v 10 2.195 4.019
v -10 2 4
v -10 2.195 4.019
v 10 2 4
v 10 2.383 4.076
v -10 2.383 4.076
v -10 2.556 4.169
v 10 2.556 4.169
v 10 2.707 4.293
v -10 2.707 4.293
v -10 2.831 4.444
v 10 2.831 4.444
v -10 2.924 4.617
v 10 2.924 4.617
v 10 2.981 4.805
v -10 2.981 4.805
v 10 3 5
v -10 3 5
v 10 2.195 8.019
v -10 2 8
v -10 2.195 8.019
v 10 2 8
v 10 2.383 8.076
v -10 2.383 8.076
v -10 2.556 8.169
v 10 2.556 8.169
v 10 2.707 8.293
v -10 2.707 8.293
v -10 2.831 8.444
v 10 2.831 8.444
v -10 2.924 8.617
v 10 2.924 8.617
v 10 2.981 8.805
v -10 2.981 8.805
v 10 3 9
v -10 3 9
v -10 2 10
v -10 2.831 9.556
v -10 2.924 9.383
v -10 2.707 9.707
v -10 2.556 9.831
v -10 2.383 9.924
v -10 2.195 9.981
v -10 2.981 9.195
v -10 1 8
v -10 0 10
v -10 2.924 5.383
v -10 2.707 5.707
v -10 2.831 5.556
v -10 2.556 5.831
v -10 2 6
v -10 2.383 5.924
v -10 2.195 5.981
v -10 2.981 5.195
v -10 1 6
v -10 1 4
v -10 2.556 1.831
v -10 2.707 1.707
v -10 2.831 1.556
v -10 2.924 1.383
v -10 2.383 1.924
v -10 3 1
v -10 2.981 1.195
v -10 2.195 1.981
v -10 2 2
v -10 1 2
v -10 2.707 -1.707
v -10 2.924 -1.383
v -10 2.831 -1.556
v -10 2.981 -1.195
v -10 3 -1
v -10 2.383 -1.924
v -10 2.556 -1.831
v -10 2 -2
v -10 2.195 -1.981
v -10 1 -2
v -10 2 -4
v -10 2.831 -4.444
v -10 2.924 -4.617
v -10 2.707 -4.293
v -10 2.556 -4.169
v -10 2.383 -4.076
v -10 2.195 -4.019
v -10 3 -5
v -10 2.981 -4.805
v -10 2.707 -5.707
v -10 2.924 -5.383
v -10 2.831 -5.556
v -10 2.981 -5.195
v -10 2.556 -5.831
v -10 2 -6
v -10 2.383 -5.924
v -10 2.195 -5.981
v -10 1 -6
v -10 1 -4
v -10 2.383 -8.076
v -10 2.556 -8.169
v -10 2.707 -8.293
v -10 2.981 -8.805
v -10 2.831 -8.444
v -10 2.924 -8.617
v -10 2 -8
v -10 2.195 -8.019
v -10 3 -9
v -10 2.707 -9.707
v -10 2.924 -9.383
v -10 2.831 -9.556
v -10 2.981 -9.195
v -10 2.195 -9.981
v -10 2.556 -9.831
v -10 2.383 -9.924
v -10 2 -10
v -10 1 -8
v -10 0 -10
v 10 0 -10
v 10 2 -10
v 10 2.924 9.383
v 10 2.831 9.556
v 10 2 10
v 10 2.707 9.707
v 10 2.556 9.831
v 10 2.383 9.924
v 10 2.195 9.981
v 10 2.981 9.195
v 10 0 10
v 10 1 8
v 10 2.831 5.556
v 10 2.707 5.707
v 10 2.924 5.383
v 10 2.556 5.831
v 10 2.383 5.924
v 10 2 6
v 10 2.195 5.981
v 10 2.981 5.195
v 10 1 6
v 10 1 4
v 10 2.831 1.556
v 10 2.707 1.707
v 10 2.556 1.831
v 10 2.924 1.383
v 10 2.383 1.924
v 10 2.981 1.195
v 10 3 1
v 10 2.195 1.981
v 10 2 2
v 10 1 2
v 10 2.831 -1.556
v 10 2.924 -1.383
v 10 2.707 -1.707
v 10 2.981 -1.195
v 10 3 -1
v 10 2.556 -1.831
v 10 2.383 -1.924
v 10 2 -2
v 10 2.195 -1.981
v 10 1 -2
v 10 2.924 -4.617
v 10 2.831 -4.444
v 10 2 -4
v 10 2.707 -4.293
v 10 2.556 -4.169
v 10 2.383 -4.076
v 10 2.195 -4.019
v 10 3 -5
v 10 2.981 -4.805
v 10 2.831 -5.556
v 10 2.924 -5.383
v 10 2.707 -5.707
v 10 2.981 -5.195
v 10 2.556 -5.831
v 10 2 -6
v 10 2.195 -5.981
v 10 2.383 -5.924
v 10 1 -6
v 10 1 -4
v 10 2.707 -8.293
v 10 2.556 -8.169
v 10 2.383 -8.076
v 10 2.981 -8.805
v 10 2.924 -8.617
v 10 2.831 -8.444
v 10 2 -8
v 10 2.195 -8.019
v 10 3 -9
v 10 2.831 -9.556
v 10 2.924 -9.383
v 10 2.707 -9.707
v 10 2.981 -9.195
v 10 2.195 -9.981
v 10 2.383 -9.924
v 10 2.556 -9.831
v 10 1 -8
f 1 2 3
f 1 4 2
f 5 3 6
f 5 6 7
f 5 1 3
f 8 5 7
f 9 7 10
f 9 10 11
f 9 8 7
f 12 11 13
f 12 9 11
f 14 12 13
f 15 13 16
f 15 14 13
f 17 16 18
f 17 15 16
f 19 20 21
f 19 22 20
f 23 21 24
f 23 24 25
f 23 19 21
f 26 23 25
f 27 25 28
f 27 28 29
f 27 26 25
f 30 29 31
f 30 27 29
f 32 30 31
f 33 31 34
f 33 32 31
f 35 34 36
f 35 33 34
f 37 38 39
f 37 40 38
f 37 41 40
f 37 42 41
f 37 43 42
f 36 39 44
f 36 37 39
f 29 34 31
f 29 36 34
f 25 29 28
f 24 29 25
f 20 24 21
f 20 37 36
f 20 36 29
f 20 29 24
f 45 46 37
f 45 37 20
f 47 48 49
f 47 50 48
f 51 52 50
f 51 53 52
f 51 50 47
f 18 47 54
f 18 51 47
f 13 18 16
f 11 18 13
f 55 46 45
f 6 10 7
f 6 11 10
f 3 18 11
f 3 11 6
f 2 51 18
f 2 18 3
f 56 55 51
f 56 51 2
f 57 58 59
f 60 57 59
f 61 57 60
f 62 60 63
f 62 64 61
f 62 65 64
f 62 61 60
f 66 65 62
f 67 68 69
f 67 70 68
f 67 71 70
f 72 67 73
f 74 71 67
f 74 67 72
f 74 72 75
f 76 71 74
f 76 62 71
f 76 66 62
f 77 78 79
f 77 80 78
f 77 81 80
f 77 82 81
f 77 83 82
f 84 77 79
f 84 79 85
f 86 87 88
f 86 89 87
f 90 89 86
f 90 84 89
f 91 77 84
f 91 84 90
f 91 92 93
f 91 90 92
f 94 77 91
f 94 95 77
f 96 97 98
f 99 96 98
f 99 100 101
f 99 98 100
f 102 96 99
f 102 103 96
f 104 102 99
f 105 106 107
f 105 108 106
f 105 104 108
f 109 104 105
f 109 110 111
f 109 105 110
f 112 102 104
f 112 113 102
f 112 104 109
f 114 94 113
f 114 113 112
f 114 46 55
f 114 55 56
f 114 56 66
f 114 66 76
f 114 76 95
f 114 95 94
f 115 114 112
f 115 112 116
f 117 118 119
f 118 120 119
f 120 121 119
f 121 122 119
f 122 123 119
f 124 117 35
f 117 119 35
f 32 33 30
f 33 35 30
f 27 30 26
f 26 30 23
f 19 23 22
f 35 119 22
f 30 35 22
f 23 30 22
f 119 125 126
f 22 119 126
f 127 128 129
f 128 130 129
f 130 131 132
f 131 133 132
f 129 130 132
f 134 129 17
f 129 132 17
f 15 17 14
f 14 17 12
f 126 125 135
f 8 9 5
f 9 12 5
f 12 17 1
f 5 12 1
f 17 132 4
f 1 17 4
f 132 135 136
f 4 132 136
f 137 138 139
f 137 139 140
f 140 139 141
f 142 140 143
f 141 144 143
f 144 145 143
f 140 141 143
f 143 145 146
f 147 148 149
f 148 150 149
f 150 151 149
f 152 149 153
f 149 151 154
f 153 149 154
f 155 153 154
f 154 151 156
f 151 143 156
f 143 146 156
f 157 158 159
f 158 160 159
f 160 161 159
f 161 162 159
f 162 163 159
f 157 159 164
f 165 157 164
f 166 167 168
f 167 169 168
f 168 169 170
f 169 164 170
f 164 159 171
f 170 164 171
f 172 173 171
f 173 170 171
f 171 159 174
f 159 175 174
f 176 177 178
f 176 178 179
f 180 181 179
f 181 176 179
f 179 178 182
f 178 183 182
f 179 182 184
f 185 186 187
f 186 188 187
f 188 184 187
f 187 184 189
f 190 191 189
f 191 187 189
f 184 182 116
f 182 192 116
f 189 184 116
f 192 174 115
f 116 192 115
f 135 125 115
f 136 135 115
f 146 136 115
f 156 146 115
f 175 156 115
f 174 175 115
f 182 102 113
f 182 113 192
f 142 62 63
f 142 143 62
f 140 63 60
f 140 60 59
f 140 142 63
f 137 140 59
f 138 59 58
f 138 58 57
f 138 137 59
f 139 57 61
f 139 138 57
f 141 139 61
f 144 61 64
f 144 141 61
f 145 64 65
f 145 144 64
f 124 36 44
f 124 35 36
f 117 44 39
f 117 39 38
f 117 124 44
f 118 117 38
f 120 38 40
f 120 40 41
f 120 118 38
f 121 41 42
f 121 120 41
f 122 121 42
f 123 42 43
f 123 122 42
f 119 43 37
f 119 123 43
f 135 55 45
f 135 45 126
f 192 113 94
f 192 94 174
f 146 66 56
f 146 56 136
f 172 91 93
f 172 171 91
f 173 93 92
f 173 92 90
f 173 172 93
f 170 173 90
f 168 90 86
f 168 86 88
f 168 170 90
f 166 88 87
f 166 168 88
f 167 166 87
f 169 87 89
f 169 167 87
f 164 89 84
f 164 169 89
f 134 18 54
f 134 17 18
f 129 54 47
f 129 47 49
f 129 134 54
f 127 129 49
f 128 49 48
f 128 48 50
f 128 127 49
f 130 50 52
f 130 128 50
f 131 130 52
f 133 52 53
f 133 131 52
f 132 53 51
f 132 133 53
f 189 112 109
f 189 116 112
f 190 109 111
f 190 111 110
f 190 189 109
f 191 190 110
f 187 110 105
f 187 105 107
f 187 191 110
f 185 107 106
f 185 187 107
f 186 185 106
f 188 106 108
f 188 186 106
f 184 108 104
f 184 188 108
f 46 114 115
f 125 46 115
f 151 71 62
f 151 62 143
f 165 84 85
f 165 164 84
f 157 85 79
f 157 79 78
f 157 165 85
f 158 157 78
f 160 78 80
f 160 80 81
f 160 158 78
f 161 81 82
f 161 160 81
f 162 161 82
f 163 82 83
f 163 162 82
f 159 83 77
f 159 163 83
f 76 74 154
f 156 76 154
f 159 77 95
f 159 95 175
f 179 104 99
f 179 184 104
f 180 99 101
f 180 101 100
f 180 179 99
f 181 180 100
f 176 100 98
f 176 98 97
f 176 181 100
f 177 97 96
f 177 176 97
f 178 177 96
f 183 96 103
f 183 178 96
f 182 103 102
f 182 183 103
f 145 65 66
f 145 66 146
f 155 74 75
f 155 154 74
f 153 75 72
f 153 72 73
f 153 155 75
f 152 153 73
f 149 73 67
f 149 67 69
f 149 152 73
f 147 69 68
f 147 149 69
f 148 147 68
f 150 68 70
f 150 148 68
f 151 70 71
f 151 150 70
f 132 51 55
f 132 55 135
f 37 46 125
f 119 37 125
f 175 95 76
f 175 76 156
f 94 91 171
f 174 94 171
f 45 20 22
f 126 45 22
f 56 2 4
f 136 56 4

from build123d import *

# Parameters (mm, degrees)
SKETCH_1_W          = 20
SKETCH_1_H          = 20
EXTRUDE_1_DEPTH     = 3
SKETCH_2_W          = 20
SKETCH_2_H          = 2
CUT_EXTRUDE_1_DEPTH = 2
FILLET_1_R          = 1


with BuildPart() as part:
    # 草图1 → 凸台-拉伸1 (new body)
    with BuildSketch(Plane(origin=(0, 0, 0), x_dir=(1, 0, 0), z_dir=(0, 1, 0))):
        Rectangle(SKETCH_1_W, SKETCH_1_H)
    extrude(amount=EXTRUDE_1_DEPTH)

    # 草图2 → 切除-拉伸1 (cut)
    with BuildSketch(Plane(origin=(0, 3, 0), x_dir=(1, 0, 0), z_dir=(0, 1, 0))):
        with Locations((0, -7)):
            Rectangle(SKETCH_2_W, SKETCH_2_H)
        with Locations((0, -3)):
            Rectangle(SKETCH_2_W, SKETCH_2_H)
        with Locations((0, 7)):
            Rectangle(SKETCH_2_W, SKETCH_2_H)
        with Locations((0, 3)):
            Rectangle(SKETCH_2_W, SKETCH_2_H)
    extrude(amount=-CUT_EXTRUDE_1_DEPTH, mode=Mode.SUBTRACT)

    # 圆角1
    fillet_1_edges = [part.edges().sort_by_distance(p)[0] for p in [
        (0, 3, 10),
        (0, 3, 6),
        (0, 3, 8),
        (0, 3, -4),
        (0, 3, -2),
        (0, 3, -8),
        (0, 3, -6),
        (0, 3, 2),
        (0, 3, 4),
        (0, 3, -10),
    ]]
    fillet(fillet_1_edges, radius=FILLET_1_R - 0.0001)  # a hair under: the kernel refuses the full size


solid = part.part
